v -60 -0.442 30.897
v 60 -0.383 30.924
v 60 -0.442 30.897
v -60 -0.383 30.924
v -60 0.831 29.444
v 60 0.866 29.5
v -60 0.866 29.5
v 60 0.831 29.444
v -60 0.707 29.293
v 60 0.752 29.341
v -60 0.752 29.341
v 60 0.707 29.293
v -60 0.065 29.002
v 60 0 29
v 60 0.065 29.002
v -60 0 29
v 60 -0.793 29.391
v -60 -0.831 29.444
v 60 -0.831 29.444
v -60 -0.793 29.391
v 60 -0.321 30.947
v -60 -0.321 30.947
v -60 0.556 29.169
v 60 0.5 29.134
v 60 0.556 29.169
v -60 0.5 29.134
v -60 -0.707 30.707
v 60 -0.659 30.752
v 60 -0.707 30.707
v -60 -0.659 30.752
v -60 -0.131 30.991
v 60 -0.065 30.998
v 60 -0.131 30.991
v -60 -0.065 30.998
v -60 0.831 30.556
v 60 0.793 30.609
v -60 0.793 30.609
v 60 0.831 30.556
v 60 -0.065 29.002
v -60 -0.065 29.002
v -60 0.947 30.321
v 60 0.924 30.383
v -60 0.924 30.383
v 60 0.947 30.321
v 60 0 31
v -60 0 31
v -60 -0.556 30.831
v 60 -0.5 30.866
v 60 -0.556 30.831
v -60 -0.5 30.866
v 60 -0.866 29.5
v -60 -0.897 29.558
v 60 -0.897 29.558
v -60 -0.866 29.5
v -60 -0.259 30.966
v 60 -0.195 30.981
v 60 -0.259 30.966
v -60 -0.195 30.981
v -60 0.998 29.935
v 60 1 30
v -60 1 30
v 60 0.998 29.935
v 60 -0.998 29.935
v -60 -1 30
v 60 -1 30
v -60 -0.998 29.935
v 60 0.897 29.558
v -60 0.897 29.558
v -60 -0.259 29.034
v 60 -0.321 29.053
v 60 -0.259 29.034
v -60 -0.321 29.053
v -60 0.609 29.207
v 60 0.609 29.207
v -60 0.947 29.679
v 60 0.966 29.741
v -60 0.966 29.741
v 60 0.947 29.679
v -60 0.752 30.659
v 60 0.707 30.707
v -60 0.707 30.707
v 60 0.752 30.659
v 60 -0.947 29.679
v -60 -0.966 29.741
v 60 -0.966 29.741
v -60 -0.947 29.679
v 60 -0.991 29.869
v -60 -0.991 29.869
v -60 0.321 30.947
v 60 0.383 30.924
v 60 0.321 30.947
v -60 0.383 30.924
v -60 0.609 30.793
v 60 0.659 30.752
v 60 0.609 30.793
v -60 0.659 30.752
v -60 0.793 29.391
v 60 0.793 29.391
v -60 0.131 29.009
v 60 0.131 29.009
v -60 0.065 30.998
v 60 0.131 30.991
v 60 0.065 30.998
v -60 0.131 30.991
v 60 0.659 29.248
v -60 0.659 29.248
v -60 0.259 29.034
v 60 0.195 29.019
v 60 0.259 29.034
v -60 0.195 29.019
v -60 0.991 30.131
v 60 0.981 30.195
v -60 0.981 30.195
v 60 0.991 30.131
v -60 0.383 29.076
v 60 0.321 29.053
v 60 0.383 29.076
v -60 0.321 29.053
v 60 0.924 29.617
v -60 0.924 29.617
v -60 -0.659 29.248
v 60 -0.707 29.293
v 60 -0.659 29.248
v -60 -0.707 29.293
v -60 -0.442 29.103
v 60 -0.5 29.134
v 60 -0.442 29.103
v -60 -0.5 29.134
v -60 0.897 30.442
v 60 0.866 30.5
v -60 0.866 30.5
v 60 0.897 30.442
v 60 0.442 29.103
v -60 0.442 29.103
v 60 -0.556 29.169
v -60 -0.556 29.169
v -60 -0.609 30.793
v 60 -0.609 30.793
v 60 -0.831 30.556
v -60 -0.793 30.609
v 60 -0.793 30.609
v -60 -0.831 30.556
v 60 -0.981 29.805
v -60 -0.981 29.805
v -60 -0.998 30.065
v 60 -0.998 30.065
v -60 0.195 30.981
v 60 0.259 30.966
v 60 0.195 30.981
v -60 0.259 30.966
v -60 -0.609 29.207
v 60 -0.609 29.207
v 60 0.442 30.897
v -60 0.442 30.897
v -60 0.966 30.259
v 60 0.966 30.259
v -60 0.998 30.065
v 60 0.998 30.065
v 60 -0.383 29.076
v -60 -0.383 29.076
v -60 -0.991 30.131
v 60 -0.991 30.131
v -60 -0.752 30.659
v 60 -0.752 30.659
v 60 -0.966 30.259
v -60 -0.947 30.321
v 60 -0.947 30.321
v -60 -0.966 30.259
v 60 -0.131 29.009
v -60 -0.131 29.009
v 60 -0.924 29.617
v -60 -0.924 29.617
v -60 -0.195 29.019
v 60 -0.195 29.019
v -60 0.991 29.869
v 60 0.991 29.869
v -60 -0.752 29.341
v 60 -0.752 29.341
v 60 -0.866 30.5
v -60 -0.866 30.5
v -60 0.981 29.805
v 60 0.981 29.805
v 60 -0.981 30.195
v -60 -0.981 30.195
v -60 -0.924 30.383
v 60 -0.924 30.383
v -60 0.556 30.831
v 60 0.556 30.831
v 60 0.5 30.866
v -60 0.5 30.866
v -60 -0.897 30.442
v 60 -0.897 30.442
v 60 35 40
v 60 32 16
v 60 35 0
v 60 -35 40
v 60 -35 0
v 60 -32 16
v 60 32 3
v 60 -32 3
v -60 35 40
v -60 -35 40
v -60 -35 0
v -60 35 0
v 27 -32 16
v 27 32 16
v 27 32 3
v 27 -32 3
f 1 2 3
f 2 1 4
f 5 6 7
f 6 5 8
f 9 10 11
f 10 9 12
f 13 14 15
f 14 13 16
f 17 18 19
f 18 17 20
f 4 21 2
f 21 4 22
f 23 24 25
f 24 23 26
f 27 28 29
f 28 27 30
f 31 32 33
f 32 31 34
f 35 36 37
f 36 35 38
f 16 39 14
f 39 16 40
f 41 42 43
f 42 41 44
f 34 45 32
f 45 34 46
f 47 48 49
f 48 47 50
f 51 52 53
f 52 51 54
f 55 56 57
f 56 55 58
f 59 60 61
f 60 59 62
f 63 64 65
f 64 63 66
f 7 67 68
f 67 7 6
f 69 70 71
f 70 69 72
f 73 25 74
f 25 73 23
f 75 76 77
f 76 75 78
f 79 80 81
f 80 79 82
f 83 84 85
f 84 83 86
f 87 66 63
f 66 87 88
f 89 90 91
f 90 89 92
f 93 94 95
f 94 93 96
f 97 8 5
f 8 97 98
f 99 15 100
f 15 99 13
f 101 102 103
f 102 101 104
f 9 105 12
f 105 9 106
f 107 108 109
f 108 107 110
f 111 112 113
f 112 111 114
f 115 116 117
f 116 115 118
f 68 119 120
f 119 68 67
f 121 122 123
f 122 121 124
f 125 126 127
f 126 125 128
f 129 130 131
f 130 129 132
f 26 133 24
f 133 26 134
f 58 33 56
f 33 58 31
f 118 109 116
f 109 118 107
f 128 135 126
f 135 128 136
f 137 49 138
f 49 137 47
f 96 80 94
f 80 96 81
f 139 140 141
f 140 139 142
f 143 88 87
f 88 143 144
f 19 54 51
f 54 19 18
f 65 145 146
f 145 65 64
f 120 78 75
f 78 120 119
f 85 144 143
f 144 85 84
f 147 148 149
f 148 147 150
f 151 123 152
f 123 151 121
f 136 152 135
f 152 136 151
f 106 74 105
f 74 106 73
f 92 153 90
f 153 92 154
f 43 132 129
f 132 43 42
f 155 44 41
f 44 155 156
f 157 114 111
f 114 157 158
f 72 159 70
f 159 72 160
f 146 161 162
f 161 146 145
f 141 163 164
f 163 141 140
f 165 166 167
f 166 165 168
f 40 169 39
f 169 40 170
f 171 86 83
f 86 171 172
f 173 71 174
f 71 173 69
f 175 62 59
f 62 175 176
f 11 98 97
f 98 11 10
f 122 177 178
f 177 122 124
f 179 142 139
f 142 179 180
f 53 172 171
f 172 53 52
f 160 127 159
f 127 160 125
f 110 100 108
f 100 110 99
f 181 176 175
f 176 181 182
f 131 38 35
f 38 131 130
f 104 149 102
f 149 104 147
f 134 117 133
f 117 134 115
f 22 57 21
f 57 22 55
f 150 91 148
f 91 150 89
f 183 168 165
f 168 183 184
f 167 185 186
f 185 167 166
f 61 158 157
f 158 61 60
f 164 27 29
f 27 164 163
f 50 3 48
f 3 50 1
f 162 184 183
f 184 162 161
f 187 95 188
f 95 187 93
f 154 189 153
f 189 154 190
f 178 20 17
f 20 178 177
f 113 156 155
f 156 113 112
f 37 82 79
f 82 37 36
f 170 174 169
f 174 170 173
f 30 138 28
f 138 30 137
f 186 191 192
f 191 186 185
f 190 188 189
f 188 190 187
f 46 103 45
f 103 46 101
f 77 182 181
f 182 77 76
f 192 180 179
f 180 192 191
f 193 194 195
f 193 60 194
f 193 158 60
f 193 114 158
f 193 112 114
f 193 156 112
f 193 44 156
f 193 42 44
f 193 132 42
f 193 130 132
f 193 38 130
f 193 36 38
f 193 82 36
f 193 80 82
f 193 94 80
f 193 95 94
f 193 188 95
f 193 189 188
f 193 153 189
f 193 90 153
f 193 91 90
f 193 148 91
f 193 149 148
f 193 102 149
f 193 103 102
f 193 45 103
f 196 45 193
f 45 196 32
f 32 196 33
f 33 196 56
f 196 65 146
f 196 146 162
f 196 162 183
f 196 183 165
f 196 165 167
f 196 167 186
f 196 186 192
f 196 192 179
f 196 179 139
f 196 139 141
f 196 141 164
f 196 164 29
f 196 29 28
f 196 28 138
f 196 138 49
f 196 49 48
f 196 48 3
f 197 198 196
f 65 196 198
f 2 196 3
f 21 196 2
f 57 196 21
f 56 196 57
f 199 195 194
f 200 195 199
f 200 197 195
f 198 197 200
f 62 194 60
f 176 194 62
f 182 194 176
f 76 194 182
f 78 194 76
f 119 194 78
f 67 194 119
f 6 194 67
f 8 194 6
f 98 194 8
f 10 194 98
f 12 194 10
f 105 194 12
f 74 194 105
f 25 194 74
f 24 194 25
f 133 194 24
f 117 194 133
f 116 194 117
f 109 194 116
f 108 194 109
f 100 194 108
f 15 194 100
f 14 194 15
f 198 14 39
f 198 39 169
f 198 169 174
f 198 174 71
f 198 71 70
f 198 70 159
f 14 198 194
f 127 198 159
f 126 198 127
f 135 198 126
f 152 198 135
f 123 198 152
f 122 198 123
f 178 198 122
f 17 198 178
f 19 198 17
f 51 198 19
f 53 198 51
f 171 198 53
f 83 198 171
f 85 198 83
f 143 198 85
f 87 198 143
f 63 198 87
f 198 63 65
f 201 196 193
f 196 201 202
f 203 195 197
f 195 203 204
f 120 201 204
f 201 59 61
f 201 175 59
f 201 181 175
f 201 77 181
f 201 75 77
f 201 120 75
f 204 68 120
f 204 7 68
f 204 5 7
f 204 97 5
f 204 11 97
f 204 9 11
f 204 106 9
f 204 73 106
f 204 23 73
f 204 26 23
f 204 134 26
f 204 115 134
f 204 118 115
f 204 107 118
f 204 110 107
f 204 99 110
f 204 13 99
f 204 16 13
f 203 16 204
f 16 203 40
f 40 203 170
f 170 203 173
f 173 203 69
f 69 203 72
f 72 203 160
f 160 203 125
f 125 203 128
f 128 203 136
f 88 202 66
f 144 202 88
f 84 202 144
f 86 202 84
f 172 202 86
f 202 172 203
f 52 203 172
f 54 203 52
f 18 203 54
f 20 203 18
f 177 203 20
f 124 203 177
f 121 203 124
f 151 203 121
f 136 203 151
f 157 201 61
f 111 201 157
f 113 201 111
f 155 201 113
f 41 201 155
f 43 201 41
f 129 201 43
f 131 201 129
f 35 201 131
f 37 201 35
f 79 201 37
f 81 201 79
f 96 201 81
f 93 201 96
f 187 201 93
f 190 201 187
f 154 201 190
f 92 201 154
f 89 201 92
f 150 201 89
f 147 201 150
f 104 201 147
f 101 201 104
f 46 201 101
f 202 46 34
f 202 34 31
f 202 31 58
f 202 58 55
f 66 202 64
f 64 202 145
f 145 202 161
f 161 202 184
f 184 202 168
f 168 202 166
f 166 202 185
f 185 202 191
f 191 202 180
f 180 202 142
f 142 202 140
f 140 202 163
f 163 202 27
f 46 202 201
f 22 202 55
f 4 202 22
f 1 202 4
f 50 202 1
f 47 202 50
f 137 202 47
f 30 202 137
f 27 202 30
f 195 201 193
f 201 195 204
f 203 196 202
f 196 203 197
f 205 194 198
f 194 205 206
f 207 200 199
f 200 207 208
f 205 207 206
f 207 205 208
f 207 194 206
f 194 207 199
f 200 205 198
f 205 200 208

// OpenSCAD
// Mini horizontal gel-electrophoresis buffer tank
// Print orientation: tank rests on XY plane at z = 0, builds upward (+Z)

// ---------------- Parameters ----------------
outer_x   = 120;   // outer length along X (mm)
outer_y   = 70;    // outer width along Y (mm)
height    = 40;    // overall height along Z (mm)
wall      = 3;     // wall thickness (mm)
floor     = 3;     // floor thickness (mm)

platform_x = 60;   // platform length along X (mm), centred
platform_top_z = 13; // platform top height above inner floor (mm) -> z = floor + 10

hole_d     = 2;    // electrode hole diameter (mm)
hole_y     = 0;    // electrode hole Y position (mm)
hole_z     = 30;   // electrode hole Z position (mm)

eps        = 0.5;  // cutter overshoot past faces (mm)
$fn        = 96;   // curve resolution

// ---------------- Derived ----------------
inner_x = outer_x - 2 * wall;        // inner length (X)
inner_y = outer_y - 2 * wall;        // inner width (Y)
inner_floor_z = floor;              // inner floor height (Z)
platform_x0 = (inner_x - platform_x) / 2;  // platform start X (centred)

// ---------------- Model ----------------
difference() {
    // Tank body (open top)
    translate([-outer_x / 2, -outer_y / 2, 0])
        cube([outer_x, outer_y, height]);

    // Central raised platform for gel tray
    translate([platform_x0, -inner_y / 2, inner_floor_z])
        cube([platform_x, inner_y, platform_top_z]);

    // Horizontal electrode holes through each end wall, along X
    for (sx = [-1, 1])
        translate([sx > 0 ? outer_x / 2 - eps : -outer_x / 2 - eps, hole_y, hole_z])
            rotate([0, 90, 0])
                cylinder(d = hole_d, h = outer_x + 2 * eps);
}
